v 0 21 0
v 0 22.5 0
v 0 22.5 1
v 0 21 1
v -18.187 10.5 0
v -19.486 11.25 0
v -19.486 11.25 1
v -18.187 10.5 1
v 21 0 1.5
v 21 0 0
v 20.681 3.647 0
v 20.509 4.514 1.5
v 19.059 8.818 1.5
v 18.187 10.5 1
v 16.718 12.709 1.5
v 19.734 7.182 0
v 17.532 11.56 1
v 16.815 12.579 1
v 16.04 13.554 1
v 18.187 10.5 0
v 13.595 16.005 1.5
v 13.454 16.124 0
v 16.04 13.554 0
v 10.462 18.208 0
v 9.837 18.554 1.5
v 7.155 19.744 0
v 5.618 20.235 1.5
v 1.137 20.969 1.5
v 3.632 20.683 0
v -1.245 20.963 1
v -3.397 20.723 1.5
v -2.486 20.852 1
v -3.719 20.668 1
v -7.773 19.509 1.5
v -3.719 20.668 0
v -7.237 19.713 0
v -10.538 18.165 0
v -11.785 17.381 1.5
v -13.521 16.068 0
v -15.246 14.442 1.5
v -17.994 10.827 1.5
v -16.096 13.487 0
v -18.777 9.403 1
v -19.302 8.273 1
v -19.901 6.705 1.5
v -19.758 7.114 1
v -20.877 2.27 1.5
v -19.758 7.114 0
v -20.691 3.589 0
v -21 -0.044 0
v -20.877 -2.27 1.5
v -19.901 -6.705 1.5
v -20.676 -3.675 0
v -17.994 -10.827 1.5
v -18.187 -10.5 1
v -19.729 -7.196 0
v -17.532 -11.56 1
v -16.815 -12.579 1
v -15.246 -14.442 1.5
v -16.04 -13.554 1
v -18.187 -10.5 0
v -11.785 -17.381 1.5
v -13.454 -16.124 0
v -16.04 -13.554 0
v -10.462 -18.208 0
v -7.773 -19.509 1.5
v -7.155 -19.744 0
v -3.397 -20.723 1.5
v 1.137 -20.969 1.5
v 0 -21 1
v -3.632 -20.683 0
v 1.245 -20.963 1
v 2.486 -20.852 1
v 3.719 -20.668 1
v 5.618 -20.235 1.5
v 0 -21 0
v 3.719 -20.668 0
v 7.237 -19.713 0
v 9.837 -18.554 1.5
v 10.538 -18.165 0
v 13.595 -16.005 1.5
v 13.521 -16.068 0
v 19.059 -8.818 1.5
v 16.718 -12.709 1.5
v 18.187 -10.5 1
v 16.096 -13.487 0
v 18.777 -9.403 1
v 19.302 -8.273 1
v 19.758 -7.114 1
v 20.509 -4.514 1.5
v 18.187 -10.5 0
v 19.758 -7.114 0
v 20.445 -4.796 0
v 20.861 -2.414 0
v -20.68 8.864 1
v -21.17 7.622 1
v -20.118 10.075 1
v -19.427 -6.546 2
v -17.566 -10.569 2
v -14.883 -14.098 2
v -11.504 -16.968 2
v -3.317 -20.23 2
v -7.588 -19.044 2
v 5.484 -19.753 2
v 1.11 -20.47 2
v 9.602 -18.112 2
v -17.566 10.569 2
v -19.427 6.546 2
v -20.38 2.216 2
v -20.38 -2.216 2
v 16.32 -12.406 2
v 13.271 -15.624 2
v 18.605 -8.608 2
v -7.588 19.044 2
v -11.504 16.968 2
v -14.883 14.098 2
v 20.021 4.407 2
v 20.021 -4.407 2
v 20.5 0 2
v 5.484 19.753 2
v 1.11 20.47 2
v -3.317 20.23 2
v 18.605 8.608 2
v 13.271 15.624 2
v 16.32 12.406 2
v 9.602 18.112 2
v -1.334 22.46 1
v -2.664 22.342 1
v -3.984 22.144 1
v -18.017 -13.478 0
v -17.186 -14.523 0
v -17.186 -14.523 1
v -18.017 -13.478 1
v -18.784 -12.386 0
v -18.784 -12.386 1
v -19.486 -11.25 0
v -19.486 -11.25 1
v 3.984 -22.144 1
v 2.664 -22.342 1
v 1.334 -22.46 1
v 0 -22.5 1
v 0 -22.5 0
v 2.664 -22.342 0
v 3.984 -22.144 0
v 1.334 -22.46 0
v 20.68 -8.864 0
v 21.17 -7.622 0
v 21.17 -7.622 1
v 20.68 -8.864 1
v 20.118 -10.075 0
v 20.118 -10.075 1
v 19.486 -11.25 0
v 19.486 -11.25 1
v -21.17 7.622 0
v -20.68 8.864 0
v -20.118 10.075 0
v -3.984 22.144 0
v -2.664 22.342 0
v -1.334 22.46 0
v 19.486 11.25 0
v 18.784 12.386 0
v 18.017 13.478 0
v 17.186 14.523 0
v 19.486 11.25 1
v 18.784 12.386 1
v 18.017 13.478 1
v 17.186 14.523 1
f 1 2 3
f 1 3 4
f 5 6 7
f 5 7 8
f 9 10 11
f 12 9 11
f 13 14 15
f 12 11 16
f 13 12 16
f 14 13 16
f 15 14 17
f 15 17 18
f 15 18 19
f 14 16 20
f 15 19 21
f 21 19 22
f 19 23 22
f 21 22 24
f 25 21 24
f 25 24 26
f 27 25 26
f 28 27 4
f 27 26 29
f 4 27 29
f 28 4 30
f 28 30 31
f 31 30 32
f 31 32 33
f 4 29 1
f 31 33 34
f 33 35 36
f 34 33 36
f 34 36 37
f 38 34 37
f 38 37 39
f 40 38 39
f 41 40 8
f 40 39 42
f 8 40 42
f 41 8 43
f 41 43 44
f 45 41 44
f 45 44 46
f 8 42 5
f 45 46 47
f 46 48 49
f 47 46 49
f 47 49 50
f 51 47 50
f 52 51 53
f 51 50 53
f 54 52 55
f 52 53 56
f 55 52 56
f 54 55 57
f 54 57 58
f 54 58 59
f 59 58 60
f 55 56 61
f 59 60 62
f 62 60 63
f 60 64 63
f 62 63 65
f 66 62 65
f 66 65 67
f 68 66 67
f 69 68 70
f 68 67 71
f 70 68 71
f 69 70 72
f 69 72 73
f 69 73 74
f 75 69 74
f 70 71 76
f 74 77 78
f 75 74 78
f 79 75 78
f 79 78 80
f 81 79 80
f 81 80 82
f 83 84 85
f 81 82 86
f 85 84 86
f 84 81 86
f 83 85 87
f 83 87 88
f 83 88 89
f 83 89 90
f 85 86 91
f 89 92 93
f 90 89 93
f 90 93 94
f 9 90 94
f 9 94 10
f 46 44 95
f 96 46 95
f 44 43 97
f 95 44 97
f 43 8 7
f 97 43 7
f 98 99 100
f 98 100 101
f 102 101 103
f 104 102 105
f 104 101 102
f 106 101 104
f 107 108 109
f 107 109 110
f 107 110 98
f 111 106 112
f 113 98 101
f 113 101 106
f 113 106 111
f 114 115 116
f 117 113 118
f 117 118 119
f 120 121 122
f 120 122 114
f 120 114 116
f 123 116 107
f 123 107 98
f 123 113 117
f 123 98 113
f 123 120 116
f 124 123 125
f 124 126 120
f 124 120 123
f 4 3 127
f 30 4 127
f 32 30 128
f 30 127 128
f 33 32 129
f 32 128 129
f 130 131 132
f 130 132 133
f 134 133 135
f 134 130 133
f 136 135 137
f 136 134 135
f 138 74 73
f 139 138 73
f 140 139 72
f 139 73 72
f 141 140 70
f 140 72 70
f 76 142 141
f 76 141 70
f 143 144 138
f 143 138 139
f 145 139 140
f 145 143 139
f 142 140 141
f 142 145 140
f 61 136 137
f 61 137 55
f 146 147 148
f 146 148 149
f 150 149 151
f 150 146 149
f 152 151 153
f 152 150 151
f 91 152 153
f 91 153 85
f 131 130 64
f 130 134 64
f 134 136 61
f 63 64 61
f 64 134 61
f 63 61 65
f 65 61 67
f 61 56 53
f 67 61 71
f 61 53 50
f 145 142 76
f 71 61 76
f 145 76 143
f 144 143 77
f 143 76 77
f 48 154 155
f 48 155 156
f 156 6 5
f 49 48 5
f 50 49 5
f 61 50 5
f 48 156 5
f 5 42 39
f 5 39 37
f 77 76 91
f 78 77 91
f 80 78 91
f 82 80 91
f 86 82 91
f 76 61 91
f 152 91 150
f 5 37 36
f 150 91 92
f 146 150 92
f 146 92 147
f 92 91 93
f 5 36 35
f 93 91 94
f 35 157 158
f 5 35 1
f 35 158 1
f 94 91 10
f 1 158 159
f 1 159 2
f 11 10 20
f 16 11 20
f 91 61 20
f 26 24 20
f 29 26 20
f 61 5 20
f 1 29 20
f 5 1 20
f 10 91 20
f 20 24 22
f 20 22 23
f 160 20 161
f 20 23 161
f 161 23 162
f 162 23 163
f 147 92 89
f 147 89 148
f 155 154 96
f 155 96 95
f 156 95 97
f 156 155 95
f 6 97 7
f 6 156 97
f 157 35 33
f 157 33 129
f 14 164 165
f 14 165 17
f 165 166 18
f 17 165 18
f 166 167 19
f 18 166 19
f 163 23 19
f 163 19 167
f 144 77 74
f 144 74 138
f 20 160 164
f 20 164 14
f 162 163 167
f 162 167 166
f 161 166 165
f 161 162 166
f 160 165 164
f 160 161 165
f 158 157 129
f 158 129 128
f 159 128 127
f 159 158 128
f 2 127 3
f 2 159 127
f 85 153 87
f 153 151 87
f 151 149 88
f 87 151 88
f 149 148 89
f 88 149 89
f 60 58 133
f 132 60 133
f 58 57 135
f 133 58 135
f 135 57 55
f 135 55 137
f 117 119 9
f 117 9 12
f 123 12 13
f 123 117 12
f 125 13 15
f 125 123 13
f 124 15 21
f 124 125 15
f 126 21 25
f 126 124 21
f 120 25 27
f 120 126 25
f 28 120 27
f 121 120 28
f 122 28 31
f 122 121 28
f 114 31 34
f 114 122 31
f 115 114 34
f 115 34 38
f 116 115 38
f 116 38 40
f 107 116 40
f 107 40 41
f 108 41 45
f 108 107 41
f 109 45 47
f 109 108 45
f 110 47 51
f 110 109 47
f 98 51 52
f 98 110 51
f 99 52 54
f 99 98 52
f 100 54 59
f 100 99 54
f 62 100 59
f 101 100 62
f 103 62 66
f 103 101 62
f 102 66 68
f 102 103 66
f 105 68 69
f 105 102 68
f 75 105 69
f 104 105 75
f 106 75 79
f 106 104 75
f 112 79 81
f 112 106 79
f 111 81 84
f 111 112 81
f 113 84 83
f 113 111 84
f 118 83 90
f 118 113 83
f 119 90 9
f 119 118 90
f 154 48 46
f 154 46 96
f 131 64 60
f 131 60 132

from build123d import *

# Parameters (mm, degrees)
SKETCH_1_R      = 21
EXTRUDE_1_DEPTH = 2
EXTRUDE_3_DEPTH = 1
CHAMFER_1_SIZE  = 0.5


with BuildPart() as part:
    # 草图1 → 凸台-拉伸1 (new body)
    with BuildSketch(Plane.XY):
        Circle(SKETCH_1_R)
    extrude(amount=EXTRUDE_1_DEPTH)

    # 草图3 → 凸台-拉伸3 (add)
    with BuildSketch(Plane(origin=(0, 0, 0), x_dir=(-1, 0, 0), z_dir=(0, 0, -1))):
        with BuildLine():
            Line((0, 22.5), (0, 21))
            ThreePointArc((0, 21), (1.866666667, 20.916872509), (3.718555113, 20.668148148))
            Line((3.718555113, 20.668148148), (3.984166192, 22.144444444))
            ThreePointArc((3.984166192, 22.144444444), (2, 22.410934831), (0, 22.5))
        make_face()
        with BuildLine():
            Line((19.485571585, 11.25), (18.186533479, 10.5))
            ThreePointArc((18.186533479, 10.5), (19.047876294, 8.841855501), (19.758418902, 7.113710881))
            Line((19.758418902, 7.113710881), (21.169734538, 7.621833087))
            ThreePointArc((21.169734538, 7.621833087), (20.408438886, 9.473416608), (19.485571585, 11.25))
        make_face()
        with BuildLine():
            Line((19.485571585, -11.25), (18.186533479, -10.5))
            ThreePointArc((18.186533479, -10.5), (17.181209627, -12.075017008), (16.039863789, -13.554437267))
            Line((16.039863789, -13.554437267), (17.185568345, -14.522611358))
            ThreePointArc((17.185568345, -14.522611358), (18.408438886, -12.937518223), (19.485571585, -11.25))
        make_face()
        with BuildLine():
            Line((0, -22.5), (0, -21))
            ThreePointArc((0, -21), (-1.866666667, -20.916872509), (-3.718555113, -20.668148148))
            Line((-3.718555113, -20.668148148), (-3.984166192, -22.144444444))
            ThreePointArc((-3.984166192, -22.144444444), (-2, -22.410934831), (0, -22.5))
        make_face()
        with BuildLine():
            Line((-19.485571585, -11.25), (-18.186533479, -10.5))
            ThreePointArc((-18.186533479, -10.5), (-19.047876294, -8.841855501), (-19.758418902, -7.113710881))
            Line((-19.758418902, -7.113710881), (-21.169734538, -7.621833087))
            ThreePointArc((-21.169734538, -7.621833087), (-20.408438886, -9.473416608), (-19.485571585, -11.25))
        make_face()
        with BuildLine():
            Line((-19.485571585, 11.25), (-18.186533479, 10.5))
            ThreePointArc((-18.186533479, 10.5), (-17.181209627, 12.075017008), (-16.039863789, 13.554437267))
            Line((-16.039863789, 13.554437267), (-17.185568345, 14.522611358))
            ThreePointArc((-17.185568345, 14.522611358), (-18.408438886, 12.937518223), (-19.485571585, 11.25))
        make_face()
    extrude(amount=-EXTRUDE_3_DEPTH)

    # 倒角1
    chamfer_1_edges = [part.edges().sort_by_distance(p)[0] for p in [
        (-21, 0, 2),
    ]]
    chamfer(chamfer_1_edges, length=CHAMFER_1_SIZE)


solid = part.part
